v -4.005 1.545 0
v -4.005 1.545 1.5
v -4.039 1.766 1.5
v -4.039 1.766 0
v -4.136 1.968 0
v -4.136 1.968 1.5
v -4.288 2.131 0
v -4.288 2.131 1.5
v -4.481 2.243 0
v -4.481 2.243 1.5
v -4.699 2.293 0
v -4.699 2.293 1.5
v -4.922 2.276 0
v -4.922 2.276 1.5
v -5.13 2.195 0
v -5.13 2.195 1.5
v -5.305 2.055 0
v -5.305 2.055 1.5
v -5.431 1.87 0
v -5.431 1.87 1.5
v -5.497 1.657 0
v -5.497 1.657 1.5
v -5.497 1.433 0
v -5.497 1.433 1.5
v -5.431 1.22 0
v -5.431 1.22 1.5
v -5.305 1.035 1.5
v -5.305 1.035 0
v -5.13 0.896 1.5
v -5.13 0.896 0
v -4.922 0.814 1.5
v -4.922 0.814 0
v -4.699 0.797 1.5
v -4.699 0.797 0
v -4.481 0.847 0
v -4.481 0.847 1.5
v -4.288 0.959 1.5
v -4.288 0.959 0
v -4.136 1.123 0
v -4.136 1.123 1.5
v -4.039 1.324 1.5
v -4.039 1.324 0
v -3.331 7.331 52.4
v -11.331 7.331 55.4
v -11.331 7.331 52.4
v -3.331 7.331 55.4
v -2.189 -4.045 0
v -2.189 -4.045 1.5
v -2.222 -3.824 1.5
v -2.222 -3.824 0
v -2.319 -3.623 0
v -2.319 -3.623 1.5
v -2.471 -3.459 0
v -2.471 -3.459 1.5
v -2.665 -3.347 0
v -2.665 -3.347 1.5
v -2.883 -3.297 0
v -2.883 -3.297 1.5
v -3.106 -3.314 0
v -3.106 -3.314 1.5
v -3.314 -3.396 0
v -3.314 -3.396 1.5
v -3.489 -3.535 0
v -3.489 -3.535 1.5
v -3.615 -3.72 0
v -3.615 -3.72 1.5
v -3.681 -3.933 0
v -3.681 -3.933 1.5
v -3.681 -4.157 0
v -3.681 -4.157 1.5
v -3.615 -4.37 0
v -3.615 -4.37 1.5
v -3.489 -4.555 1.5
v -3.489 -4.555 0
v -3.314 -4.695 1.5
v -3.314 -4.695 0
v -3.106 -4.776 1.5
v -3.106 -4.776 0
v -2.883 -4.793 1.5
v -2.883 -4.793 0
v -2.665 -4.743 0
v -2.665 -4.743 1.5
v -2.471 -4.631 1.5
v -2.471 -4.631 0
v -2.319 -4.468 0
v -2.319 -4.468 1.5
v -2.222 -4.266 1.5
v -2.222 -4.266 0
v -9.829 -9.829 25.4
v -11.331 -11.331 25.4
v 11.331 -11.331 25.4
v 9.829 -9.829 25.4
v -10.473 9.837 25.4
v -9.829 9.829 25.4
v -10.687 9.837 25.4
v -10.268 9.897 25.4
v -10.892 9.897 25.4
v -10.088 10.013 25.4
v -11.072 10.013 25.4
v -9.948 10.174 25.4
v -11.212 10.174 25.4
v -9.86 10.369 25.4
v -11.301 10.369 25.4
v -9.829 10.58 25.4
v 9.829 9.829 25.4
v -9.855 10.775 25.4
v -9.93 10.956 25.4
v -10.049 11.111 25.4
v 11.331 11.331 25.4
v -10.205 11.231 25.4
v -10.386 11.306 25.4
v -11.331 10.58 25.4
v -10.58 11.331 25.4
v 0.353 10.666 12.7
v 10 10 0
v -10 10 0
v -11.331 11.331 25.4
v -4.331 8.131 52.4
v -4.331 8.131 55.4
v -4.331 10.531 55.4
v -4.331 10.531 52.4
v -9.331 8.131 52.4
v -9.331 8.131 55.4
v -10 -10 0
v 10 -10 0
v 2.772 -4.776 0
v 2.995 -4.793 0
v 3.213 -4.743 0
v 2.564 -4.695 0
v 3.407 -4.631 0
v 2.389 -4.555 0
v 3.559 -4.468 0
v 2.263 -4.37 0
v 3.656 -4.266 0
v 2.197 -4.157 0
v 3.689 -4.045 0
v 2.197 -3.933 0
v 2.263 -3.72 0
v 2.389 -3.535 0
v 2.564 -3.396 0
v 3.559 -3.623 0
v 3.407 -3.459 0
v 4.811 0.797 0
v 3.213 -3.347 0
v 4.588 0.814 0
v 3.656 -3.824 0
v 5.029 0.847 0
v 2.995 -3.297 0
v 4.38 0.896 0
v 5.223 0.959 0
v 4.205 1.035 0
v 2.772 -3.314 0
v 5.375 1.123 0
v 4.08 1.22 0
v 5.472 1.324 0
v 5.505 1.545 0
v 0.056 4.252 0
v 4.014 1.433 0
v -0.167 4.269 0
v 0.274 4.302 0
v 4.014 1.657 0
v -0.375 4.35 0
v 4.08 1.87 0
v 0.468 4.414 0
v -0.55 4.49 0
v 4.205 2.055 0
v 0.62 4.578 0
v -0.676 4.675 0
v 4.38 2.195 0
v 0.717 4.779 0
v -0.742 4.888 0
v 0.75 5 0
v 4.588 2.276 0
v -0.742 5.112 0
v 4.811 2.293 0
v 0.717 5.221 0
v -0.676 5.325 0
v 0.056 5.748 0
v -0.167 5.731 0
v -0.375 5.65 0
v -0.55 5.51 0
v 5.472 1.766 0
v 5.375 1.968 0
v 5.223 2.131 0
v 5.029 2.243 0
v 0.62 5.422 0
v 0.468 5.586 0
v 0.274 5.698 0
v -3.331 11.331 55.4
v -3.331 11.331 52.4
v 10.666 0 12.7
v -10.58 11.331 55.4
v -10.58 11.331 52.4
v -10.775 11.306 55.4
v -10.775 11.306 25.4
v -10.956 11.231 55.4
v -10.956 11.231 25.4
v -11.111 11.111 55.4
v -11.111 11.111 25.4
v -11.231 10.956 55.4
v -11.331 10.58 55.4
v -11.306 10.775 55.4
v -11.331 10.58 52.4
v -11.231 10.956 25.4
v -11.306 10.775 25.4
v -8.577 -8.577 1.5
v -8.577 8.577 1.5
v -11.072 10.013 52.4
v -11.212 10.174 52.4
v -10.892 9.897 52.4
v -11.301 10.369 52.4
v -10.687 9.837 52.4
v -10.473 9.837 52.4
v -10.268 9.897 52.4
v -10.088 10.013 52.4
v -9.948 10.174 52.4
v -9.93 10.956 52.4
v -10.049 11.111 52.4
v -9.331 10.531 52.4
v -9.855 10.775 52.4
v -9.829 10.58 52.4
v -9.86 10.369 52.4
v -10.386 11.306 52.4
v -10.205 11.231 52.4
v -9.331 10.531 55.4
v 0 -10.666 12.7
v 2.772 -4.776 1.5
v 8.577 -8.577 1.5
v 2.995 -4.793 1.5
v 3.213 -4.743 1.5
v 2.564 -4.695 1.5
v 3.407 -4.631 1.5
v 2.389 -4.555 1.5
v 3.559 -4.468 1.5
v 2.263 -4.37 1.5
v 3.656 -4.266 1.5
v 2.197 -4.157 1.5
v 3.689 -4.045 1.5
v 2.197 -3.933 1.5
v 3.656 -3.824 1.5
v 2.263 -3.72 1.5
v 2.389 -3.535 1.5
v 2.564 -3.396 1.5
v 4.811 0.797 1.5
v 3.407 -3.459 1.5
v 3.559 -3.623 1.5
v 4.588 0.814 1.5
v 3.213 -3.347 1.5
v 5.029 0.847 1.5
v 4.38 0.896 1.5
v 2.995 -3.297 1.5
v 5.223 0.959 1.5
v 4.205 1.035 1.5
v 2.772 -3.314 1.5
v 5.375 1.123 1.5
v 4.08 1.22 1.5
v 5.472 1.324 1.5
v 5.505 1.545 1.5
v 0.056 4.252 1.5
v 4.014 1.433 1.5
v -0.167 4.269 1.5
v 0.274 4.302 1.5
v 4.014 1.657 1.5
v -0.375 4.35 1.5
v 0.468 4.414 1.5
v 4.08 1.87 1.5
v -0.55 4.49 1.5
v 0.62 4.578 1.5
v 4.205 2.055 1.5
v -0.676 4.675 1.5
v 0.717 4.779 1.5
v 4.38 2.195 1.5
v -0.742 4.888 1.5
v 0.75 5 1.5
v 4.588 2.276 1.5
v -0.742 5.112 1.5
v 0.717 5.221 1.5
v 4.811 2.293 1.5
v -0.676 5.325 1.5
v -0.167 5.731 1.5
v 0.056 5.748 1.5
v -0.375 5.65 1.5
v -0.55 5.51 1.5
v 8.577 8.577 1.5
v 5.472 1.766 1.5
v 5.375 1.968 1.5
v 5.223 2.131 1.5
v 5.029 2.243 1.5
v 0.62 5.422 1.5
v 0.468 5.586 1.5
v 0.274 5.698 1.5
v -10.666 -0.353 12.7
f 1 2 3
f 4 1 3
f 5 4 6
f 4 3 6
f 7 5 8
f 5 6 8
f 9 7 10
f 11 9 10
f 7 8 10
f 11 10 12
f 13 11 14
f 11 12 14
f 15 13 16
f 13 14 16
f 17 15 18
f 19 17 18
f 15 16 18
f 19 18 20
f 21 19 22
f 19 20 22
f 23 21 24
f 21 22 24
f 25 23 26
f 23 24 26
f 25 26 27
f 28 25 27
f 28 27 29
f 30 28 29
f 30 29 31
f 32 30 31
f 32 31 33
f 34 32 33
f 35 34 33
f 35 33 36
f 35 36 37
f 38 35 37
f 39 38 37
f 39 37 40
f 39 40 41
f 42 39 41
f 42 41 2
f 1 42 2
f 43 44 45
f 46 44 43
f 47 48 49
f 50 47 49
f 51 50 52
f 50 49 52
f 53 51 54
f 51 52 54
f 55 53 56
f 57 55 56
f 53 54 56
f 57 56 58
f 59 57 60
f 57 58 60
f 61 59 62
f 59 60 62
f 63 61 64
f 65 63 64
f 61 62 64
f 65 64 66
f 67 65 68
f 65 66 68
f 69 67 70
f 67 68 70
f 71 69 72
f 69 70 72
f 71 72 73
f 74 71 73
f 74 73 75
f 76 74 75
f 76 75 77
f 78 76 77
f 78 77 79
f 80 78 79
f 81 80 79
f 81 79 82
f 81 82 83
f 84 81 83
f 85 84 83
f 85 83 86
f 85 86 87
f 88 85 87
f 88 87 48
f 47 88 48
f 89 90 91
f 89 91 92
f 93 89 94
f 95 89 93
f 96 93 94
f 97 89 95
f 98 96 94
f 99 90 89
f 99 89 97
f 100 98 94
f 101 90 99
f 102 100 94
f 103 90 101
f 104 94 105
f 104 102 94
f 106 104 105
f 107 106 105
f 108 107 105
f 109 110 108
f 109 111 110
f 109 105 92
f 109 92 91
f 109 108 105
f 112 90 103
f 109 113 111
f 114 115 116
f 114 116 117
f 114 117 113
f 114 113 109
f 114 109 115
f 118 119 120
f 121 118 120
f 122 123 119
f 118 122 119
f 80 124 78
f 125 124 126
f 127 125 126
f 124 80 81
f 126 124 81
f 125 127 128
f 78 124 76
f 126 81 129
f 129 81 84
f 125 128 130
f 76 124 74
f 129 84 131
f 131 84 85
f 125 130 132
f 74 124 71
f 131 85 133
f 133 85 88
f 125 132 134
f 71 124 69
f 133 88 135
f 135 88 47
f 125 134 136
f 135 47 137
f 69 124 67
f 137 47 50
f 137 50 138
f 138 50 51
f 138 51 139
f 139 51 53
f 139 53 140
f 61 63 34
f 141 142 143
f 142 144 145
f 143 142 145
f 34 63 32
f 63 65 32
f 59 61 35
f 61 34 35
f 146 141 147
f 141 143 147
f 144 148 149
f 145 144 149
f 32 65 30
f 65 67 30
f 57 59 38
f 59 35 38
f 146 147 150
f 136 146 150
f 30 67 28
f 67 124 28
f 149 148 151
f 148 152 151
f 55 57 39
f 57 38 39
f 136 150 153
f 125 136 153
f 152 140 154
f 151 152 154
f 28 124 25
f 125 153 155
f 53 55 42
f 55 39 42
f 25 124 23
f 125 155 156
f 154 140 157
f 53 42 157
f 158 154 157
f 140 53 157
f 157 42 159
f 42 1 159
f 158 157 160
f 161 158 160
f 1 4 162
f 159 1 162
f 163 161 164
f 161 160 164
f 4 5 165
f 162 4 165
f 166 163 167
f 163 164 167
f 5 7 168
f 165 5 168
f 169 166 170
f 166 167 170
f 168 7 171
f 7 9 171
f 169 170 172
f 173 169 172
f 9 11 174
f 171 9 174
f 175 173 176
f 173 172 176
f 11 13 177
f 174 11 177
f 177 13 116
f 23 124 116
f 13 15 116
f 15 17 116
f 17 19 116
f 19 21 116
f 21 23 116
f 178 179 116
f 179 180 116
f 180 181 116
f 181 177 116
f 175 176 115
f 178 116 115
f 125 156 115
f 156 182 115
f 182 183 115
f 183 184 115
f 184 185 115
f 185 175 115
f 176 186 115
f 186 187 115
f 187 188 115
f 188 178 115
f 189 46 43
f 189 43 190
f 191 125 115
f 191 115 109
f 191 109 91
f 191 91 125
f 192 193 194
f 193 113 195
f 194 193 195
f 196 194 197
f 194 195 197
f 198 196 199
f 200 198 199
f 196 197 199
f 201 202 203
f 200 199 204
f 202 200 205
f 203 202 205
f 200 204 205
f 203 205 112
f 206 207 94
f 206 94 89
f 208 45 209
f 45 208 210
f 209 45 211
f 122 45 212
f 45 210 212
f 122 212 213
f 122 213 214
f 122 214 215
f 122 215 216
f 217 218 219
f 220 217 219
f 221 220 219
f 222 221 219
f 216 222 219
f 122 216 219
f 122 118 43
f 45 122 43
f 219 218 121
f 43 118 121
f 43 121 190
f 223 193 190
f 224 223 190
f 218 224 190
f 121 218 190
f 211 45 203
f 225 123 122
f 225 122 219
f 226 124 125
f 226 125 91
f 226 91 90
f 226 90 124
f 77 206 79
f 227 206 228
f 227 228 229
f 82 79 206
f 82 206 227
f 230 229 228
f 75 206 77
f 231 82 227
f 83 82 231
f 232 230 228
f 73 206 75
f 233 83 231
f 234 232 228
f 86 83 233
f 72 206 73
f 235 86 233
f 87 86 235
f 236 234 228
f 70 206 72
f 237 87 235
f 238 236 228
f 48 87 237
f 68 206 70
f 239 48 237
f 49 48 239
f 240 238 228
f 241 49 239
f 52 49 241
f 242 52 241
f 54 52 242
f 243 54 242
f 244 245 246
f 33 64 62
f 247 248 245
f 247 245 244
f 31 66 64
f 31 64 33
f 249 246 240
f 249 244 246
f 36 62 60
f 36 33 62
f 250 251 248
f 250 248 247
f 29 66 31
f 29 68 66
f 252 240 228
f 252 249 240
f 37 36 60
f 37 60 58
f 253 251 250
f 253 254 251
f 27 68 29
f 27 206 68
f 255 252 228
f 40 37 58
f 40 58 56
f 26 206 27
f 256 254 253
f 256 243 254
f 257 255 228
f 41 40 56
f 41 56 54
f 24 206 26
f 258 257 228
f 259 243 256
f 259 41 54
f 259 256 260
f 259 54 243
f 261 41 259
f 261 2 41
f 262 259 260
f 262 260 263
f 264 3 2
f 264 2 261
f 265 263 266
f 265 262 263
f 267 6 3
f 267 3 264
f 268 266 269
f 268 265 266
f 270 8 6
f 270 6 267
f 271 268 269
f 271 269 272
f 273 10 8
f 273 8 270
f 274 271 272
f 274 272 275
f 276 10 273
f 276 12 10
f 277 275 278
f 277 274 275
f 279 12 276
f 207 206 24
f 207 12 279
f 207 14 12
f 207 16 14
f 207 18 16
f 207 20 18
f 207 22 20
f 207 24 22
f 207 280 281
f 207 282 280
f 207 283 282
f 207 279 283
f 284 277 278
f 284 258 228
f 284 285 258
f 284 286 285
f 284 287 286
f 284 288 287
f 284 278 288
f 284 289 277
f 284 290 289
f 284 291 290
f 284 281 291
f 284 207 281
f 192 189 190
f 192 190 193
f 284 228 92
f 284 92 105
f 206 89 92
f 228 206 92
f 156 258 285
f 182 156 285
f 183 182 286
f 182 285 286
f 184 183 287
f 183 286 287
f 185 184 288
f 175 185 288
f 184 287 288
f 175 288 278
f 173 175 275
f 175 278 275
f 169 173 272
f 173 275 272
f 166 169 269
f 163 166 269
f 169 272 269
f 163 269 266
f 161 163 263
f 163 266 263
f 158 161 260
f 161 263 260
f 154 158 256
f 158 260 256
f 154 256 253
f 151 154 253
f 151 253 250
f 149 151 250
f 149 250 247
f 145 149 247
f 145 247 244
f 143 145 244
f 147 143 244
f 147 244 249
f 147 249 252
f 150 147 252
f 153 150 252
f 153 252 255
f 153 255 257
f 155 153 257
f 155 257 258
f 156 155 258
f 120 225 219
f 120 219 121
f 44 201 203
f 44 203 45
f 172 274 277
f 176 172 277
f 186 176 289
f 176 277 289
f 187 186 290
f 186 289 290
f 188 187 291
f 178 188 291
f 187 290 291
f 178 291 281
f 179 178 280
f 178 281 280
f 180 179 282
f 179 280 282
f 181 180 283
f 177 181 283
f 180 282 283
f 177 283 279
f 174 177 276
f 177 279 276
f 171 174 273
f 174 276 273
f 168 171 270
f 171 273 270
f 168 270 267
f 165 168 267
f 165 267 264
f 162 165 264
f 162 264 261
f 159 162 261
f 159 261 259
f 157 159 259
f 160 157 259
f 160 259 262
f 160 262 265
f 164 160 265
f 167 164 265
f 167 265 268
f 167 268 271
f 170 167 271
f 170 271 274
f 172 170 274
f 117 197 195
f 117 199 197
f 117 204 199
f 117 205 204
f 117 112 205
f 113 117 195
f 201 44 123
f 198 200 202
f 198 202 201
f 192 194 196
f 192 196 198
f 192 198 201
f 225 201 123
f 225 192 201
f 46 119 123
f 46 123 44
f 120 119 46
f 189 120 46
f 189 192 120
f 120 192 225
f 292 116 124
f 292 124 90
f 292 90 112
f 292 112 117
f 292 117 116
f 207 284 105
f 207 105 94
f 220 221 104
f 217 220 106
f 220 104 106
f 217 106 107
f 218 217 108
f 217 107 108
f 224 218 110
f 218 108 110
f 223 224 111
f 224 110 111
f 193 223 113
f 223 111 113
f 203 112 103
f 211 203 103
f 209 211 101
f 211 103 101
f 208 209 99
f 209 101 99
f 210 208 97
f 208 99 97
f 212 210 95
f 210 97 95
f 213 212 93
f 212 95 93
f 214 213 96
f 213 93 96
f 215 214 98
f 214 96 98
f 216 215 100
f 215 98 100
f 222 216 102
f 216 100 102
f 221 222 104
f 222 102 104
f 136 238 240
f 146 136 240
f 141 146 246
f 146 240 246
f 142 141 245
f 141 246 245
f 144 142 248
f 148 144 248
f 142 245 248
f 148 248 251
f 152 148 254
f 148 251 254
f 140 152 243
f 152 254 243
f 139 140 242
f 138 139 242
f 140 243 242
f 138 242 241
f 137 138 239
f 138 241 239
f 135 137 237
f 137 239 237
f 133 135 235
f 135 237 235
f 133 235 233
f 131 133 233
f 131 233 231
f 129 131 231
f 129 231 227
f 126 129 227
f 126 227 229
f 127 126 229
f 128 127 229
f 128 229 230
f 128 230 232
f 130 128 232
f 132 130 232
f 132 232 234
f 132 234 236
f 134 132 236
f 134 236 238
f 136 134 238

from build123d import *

# Parameters (mm, degrees)
F0_W     = 20
F0_H     = 20
F1_DEPTH = 25.4
F1_TAPER = -3
F2_T     = -1.5
F3_R     = 0.75
F4_DEPTH = 1.5010001
F6_DEPTH = 30
F7_W     = 5
F7_H     = 2.4
F8_DEPTH = 3


with BuildPart() as f1:
    # F0 (on Top) → F1 (new body)
    with BuildSketch(Plane.XY):
        Rectangle(F0_W, F0_H)
    extrude(amount=F1_DEPTH, taper=F1_TAPER)

    # F2
    f2_openings = [f1.faces().sort_by_distance(p)[0] for p in [
        (0, 0, 25.4),
    ]]
    offset(amount=F2_T, openings=f2_openings)

    # F3 (on face) → F4 (cut, through all)
    with BuildSketch(Plane.XY.offset(1.5)):
        with Locations((0, 5)):
            Circle(F3_R)
        with Locations((4.7552825815, 1.5450849719)):
            Circle(F3_R)
        with Locations((2.9389262615, -4.0450849719)):
            Circle(F3_R)
        with Locations((-2.9389262615, -4.0450849719)):
            Circle(F3_R)
        with Locations((-4.7552825815, 1.5450849719)):
            Circle(F3_R)
    extrude(amount=-F4_DEPTH, mode=Mode.SUBTRACT)

    # F5 (on face) → F6 (join)
    with BuildSketch(Plane.XY.offset(25.4)):
        with BuildLine():
            ThreePointArc((-11.3311575938, 10.5801283388), (-10.5801283366, 9.8290990748), (-9.8290990748, 10.5801283343))
            ThreePointArc((-9.8290990748, 10.5801283343), (-10.049070452, 11.1111862166), (-10.5801283343, 11.3311575938))
            ThreePointArc((-10.5801283343, 11.3311575938), (-11.111186215, 11.1111862181), (-11.3311575938, 10.5801283388))
        make_face()
    extrude(amount=F6_DEPTH)

    # F7 (on face) → F8 (join)
    with BuildSketch(Plane.XY.offset(55.4)):
        with BuildLine():
            Line((-3.3311575938, 11.3311575938), (-10.5801283343, 11.3311575938))
            ThreePointArc((-10.5801283343, 11.3311575938), (-10.049070452, 11.1111862166), (-9.8290990748, 10.5801283343))
            ThreePointArc((-9.8290990748, 10.5801283343), (-10.5801283343, 9.8290990748), (-11.3311575938, 10.5801283343))
            Line((-11.3311575938, 10.5801283343), (-11.3311575938, 7.3311575938))
            Line((-11.3311575938, 7.3311575938), (-3.3311575938, 7.3311575938))
            Line((-3.3311575938, 7.3311575938), (-3.3311575938, 11.3311575938))
        make_face()
        with Locations((-6.8311575938, 9.3311575938)):
            Rectangle(F7_W, F7_H, mode=Mode.SUBTRACT)
    extrude(amount=-F8_DEPTH)


solid = f1.part
